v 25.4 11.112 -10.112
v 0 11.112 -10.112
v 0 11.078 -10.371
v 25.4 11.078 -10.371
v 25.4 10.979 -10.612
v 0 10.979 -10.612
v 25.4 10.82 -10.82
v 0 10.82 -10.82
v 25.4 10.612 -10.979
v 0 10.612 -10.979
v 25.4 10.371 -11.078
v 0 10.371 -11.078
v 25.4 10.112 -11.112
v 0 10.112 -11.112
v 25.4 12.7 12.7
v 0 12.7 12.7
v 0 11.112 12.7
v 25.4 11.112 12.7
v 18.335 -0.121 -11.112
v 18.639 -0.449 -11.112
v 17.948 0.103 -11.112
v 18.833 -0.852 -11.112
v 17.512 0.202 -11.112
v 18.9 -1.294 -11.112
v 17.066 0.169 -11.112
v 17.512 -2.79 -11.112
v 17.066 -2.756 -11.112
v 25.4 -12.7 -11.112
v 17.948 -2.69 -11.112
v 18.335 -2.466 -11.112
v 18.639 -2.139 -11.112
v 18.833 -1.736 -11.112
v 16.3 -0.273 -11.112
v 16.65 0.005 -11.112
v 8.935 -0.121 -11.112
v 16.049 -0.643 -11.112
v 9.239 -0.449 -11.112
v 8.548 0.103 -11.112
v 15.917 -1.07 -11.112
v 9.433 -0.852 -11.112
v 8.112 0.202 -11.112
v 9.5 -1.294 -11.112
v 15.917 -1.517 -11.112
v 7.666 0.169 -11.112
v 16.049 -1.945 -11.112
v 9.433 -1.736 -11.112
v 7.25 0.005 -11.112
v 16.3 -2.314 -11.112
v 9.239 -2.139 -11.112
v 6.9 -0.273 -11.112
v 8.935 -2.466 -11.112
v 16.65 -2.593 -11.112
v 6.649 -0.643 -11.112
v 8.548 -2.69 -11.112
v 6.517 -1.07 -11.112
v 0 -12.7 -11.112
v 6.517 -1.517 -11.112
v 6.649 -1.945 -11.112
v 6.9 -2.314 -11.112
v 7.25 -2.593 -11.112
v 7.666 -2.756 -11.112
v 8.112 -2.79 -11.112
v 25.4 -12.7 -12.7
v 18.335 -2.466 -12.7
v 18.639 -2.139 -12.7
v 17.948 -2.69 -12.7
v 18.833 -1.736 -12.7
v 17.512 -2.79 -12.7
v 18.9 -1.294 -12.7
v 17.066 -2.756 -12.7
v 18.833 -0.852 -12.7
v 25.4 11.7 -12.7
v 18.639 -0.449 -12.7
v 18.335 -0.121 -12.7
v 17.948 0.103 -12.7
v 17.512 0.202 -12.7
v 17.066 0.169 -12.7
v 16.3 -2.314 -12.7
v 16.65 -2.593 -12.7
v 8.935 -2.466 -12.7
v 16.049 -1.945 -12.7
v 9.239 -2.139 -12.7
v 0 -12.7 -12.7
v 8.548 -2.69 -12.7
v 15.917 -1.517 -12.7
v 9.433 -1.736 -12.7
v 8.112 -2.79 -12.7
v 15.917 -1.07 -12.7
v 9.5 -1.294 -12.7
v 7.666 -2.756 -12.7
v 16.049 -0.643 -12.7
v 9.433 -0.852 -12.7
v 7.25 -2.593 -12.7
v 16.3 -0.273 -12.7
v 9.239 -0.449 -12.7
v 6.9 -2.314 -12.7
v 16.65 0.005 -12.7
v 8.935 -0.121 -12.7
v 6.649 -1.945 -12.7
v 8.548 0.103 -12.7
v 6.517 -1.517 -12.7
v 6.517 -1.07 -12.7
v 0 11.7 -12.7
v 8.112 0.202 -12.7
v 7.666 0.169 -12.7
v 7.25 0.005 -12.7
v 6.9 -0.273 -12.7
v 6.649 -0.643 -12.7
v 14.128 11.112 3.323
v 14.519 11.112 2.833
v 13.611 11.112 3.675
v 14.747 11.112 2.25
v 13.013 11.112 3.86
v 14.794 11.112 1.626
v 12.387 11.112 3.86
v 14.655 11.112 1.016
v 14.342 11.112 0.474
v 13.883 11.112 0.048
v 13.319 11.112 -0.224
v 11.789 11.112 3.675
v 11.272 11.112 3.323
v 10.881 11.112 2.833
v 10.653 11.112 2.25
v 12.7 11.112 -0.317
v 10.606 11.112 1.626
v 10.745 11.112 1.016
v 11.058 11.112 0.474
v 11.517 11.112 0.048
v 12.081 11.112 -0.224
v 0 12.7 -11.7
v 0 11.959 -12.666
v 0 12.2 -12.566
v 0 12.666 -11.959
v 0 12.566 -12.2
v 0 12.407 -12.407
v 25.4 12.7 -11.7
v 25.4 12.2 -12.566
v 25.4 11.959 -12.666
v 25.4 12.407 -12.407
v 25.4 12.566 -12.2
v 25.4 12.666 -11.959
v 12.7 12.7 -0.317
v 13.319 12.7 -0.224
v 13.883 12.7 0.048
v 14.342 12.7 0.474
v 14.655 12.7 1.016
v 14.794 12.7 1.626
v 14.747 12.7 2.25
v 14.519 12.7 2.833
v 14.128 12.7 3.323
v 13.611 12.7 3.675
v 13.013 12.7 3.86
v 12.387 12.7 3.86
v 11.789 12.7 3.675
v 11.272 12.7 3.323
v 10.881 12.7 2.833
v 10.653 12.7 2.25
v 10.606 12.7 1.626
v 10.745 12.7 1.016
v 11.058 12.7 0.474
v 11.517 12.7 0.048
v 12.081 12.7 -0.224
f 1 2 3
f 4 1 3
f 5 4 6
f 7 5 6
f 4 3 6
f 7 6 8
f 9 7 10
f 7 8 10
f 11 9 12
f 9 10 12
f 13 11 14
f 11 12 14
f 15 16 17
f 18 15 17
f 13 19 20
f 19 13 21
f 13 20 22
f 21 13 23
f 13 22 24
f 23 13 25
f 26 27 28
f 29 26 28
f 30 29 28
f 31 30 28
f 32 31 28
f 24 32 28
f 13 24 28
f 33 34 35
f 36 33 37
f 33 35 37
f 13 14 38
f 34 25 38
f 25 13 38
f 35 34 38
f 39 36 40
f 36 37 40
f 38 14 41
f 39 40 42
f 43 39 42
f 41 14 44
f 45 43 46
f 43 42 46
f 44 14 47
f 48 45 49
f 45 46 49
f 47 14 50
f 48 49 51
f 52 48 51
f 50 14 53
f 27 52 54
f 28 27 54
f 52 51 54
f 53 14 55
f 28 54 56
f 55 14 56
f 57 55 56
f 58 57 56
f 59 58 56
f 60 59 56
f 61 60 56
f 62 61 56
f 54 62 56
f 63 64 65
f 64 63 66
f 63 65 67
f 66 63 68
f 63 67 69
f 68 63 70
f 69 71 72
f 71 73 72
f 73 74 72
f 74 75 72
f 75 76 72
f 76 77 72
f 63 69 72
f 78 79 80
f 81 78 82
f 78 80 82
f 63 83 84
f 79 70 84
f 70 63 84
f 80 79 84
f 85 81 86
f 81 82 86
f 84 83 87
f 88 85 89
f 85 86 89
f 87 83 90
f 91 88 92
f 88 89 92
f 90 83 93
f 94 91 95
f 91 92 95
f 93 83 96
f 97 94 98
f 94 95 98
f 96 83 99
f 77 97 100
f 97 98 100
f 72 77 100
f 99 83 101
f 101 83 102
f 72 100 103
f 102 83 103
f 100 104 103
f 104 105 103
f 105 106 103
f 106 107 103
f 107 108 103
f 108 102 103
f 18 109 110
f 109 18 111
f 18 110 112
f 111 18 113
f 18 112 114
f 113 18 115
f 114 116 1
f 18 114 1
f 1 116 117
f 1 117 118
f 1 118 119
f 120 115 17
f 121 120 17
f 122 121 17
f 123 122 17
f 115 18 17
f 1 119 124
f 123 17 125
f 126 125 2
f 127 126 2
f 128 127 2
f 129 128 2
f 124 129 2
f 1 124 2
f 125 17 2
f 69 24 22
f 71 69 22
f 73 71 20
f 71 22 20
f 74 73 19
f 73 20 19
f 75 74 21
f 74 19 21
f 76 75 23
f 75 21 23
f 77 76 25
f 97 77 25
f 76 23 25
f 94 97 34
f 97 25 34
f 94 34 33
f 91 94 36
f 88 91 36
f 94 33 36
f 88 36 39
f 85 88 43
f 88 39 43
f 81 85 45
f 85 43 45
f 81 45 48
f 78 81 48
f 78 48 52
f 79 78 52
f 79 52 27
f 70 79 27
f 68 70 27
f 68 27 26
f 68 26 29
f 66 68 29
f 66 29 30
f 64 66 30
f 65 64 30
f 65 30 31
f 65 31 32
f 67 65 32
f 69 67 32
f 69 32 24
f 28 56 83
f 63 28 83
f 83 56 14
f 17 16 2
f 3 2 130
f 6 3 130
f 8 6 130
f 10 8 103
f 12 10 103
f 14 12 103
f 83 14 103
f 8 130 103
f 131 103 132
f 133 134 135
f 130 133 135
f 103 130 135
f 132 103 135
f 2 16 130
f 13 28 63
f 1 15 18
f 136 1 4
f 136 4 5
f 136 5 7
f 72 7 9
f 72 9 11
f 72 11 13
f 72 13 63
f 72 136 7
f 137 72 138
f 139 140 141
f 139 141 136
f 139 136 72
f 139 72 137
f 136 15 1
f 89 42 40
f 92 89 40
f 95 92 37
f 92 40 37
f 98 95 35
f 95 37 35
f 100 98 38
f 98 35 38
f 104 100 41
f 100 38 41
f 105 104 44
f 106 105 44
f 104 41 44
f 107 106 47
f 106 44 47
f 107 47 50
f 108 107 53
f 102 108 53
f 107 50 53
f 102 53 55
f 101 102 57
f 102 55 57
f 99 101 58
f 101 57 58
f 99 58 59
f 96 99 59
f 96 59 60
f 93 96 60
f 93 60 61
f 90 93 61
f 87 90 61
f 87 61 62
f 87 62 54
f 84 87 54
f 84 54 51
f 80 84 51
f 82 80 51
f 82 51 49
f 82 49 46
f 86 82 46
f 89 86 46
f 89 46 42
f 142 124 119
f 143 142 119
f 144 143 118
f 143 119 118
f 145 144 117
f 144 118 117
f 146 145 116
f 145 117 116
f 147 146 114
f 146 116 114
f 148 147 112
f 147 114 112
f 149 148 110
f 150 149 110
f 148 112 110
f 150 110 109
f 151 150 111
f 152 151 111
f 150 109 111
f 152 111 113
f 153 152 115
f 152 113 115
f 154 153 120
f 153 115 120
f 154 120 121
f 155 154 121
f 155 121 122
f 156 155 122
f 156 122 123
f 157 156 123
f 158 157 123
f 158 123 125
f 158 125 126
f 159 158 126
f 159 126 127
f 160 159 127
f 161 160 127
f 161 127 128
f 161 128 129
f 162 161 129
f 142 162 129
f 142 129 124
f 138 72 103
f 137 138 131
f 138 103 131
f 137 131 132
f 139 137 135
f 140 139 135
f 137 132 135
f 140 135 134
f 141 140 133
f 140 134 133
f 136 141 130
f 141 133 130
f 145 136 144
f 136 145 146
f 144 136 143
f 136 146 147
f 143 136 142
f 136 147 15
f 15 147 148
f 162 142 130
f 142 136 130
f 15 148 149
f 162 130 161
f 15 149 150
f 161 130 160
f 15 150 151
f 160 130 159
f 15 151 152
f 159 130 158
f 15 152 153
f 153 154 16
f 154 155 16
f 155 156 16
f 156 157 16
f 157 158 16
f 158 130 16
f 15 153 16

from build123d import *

# Parameters (mm, degrees)
BOSS_EXTRUDE1_DEPTH = 25.4
SKETCH2_R           = 1.5
CUT_EXTRUDE1_DEPTH  = 25.4
SKETCH3_R           = 2.1
CUT_EXTRUDE2_DEPTH  = 25.4


with BuildPart() as part:
    # Sketch1 → Boss-Extrude1 (new body)
    with BuildSketch(Plane(origin=(0, 0, 0), x_dir=(0, 0, -1), z_dir=(1, 0, 0))):
        with BuildLine():
            Line((11.1125, -12.7), (12.7, -12.7))
            Line((12.7, -12.7), (12.7, 11.7))
            ThreePointArc((12.7, 11.7), (12.407106781, 12.407106781), (11.7, 12.7))
            Line((11.7, 12.7), (-12.7, 12.7))
            Line((-12.7, 12.7), (-12.7, 11.1125))
            Line((-12.7, 11.1125), (10.1125, 11.1125))
            ThreePointArc((10.1125, 11.1125), (10.819606781, 10.819606781), (11.1125, 10.1125))
            Line((11.1125, 10.1125), (11.1125, -12.7))
        make_face()
    extrude(amount=BOSS_EXTRUDE1_DEPTH)

    # Sketch2 → Cut-Extrude1 (cut)
    with BuildSketch(Plane.XY.offset(-11.1125)):
        with Locations((8, -1.29375)):
            Circle(SKETCH2_R)
        with Locations((17.4, -1.29375)):
            Circle(SKETCH2_R)
    extrude(amount=-CUT_EXTRUDE1_DEPTH, mode=Mode.SUBTRACT)

    # Sketch3 → Cut-Extrude2 (cut)
    with BuildSketch(Plane.XZ.offset(-11.1125)):
        with Locations(Location((12.7, 1.783154784, 0), (0, 0, 270))):
            Circle(SKETCH3_R)
    extrude(amount=-CUT_EXTRUDE2_DEPTH, mode=Mode.SUBTRACT)


solid = part.part
